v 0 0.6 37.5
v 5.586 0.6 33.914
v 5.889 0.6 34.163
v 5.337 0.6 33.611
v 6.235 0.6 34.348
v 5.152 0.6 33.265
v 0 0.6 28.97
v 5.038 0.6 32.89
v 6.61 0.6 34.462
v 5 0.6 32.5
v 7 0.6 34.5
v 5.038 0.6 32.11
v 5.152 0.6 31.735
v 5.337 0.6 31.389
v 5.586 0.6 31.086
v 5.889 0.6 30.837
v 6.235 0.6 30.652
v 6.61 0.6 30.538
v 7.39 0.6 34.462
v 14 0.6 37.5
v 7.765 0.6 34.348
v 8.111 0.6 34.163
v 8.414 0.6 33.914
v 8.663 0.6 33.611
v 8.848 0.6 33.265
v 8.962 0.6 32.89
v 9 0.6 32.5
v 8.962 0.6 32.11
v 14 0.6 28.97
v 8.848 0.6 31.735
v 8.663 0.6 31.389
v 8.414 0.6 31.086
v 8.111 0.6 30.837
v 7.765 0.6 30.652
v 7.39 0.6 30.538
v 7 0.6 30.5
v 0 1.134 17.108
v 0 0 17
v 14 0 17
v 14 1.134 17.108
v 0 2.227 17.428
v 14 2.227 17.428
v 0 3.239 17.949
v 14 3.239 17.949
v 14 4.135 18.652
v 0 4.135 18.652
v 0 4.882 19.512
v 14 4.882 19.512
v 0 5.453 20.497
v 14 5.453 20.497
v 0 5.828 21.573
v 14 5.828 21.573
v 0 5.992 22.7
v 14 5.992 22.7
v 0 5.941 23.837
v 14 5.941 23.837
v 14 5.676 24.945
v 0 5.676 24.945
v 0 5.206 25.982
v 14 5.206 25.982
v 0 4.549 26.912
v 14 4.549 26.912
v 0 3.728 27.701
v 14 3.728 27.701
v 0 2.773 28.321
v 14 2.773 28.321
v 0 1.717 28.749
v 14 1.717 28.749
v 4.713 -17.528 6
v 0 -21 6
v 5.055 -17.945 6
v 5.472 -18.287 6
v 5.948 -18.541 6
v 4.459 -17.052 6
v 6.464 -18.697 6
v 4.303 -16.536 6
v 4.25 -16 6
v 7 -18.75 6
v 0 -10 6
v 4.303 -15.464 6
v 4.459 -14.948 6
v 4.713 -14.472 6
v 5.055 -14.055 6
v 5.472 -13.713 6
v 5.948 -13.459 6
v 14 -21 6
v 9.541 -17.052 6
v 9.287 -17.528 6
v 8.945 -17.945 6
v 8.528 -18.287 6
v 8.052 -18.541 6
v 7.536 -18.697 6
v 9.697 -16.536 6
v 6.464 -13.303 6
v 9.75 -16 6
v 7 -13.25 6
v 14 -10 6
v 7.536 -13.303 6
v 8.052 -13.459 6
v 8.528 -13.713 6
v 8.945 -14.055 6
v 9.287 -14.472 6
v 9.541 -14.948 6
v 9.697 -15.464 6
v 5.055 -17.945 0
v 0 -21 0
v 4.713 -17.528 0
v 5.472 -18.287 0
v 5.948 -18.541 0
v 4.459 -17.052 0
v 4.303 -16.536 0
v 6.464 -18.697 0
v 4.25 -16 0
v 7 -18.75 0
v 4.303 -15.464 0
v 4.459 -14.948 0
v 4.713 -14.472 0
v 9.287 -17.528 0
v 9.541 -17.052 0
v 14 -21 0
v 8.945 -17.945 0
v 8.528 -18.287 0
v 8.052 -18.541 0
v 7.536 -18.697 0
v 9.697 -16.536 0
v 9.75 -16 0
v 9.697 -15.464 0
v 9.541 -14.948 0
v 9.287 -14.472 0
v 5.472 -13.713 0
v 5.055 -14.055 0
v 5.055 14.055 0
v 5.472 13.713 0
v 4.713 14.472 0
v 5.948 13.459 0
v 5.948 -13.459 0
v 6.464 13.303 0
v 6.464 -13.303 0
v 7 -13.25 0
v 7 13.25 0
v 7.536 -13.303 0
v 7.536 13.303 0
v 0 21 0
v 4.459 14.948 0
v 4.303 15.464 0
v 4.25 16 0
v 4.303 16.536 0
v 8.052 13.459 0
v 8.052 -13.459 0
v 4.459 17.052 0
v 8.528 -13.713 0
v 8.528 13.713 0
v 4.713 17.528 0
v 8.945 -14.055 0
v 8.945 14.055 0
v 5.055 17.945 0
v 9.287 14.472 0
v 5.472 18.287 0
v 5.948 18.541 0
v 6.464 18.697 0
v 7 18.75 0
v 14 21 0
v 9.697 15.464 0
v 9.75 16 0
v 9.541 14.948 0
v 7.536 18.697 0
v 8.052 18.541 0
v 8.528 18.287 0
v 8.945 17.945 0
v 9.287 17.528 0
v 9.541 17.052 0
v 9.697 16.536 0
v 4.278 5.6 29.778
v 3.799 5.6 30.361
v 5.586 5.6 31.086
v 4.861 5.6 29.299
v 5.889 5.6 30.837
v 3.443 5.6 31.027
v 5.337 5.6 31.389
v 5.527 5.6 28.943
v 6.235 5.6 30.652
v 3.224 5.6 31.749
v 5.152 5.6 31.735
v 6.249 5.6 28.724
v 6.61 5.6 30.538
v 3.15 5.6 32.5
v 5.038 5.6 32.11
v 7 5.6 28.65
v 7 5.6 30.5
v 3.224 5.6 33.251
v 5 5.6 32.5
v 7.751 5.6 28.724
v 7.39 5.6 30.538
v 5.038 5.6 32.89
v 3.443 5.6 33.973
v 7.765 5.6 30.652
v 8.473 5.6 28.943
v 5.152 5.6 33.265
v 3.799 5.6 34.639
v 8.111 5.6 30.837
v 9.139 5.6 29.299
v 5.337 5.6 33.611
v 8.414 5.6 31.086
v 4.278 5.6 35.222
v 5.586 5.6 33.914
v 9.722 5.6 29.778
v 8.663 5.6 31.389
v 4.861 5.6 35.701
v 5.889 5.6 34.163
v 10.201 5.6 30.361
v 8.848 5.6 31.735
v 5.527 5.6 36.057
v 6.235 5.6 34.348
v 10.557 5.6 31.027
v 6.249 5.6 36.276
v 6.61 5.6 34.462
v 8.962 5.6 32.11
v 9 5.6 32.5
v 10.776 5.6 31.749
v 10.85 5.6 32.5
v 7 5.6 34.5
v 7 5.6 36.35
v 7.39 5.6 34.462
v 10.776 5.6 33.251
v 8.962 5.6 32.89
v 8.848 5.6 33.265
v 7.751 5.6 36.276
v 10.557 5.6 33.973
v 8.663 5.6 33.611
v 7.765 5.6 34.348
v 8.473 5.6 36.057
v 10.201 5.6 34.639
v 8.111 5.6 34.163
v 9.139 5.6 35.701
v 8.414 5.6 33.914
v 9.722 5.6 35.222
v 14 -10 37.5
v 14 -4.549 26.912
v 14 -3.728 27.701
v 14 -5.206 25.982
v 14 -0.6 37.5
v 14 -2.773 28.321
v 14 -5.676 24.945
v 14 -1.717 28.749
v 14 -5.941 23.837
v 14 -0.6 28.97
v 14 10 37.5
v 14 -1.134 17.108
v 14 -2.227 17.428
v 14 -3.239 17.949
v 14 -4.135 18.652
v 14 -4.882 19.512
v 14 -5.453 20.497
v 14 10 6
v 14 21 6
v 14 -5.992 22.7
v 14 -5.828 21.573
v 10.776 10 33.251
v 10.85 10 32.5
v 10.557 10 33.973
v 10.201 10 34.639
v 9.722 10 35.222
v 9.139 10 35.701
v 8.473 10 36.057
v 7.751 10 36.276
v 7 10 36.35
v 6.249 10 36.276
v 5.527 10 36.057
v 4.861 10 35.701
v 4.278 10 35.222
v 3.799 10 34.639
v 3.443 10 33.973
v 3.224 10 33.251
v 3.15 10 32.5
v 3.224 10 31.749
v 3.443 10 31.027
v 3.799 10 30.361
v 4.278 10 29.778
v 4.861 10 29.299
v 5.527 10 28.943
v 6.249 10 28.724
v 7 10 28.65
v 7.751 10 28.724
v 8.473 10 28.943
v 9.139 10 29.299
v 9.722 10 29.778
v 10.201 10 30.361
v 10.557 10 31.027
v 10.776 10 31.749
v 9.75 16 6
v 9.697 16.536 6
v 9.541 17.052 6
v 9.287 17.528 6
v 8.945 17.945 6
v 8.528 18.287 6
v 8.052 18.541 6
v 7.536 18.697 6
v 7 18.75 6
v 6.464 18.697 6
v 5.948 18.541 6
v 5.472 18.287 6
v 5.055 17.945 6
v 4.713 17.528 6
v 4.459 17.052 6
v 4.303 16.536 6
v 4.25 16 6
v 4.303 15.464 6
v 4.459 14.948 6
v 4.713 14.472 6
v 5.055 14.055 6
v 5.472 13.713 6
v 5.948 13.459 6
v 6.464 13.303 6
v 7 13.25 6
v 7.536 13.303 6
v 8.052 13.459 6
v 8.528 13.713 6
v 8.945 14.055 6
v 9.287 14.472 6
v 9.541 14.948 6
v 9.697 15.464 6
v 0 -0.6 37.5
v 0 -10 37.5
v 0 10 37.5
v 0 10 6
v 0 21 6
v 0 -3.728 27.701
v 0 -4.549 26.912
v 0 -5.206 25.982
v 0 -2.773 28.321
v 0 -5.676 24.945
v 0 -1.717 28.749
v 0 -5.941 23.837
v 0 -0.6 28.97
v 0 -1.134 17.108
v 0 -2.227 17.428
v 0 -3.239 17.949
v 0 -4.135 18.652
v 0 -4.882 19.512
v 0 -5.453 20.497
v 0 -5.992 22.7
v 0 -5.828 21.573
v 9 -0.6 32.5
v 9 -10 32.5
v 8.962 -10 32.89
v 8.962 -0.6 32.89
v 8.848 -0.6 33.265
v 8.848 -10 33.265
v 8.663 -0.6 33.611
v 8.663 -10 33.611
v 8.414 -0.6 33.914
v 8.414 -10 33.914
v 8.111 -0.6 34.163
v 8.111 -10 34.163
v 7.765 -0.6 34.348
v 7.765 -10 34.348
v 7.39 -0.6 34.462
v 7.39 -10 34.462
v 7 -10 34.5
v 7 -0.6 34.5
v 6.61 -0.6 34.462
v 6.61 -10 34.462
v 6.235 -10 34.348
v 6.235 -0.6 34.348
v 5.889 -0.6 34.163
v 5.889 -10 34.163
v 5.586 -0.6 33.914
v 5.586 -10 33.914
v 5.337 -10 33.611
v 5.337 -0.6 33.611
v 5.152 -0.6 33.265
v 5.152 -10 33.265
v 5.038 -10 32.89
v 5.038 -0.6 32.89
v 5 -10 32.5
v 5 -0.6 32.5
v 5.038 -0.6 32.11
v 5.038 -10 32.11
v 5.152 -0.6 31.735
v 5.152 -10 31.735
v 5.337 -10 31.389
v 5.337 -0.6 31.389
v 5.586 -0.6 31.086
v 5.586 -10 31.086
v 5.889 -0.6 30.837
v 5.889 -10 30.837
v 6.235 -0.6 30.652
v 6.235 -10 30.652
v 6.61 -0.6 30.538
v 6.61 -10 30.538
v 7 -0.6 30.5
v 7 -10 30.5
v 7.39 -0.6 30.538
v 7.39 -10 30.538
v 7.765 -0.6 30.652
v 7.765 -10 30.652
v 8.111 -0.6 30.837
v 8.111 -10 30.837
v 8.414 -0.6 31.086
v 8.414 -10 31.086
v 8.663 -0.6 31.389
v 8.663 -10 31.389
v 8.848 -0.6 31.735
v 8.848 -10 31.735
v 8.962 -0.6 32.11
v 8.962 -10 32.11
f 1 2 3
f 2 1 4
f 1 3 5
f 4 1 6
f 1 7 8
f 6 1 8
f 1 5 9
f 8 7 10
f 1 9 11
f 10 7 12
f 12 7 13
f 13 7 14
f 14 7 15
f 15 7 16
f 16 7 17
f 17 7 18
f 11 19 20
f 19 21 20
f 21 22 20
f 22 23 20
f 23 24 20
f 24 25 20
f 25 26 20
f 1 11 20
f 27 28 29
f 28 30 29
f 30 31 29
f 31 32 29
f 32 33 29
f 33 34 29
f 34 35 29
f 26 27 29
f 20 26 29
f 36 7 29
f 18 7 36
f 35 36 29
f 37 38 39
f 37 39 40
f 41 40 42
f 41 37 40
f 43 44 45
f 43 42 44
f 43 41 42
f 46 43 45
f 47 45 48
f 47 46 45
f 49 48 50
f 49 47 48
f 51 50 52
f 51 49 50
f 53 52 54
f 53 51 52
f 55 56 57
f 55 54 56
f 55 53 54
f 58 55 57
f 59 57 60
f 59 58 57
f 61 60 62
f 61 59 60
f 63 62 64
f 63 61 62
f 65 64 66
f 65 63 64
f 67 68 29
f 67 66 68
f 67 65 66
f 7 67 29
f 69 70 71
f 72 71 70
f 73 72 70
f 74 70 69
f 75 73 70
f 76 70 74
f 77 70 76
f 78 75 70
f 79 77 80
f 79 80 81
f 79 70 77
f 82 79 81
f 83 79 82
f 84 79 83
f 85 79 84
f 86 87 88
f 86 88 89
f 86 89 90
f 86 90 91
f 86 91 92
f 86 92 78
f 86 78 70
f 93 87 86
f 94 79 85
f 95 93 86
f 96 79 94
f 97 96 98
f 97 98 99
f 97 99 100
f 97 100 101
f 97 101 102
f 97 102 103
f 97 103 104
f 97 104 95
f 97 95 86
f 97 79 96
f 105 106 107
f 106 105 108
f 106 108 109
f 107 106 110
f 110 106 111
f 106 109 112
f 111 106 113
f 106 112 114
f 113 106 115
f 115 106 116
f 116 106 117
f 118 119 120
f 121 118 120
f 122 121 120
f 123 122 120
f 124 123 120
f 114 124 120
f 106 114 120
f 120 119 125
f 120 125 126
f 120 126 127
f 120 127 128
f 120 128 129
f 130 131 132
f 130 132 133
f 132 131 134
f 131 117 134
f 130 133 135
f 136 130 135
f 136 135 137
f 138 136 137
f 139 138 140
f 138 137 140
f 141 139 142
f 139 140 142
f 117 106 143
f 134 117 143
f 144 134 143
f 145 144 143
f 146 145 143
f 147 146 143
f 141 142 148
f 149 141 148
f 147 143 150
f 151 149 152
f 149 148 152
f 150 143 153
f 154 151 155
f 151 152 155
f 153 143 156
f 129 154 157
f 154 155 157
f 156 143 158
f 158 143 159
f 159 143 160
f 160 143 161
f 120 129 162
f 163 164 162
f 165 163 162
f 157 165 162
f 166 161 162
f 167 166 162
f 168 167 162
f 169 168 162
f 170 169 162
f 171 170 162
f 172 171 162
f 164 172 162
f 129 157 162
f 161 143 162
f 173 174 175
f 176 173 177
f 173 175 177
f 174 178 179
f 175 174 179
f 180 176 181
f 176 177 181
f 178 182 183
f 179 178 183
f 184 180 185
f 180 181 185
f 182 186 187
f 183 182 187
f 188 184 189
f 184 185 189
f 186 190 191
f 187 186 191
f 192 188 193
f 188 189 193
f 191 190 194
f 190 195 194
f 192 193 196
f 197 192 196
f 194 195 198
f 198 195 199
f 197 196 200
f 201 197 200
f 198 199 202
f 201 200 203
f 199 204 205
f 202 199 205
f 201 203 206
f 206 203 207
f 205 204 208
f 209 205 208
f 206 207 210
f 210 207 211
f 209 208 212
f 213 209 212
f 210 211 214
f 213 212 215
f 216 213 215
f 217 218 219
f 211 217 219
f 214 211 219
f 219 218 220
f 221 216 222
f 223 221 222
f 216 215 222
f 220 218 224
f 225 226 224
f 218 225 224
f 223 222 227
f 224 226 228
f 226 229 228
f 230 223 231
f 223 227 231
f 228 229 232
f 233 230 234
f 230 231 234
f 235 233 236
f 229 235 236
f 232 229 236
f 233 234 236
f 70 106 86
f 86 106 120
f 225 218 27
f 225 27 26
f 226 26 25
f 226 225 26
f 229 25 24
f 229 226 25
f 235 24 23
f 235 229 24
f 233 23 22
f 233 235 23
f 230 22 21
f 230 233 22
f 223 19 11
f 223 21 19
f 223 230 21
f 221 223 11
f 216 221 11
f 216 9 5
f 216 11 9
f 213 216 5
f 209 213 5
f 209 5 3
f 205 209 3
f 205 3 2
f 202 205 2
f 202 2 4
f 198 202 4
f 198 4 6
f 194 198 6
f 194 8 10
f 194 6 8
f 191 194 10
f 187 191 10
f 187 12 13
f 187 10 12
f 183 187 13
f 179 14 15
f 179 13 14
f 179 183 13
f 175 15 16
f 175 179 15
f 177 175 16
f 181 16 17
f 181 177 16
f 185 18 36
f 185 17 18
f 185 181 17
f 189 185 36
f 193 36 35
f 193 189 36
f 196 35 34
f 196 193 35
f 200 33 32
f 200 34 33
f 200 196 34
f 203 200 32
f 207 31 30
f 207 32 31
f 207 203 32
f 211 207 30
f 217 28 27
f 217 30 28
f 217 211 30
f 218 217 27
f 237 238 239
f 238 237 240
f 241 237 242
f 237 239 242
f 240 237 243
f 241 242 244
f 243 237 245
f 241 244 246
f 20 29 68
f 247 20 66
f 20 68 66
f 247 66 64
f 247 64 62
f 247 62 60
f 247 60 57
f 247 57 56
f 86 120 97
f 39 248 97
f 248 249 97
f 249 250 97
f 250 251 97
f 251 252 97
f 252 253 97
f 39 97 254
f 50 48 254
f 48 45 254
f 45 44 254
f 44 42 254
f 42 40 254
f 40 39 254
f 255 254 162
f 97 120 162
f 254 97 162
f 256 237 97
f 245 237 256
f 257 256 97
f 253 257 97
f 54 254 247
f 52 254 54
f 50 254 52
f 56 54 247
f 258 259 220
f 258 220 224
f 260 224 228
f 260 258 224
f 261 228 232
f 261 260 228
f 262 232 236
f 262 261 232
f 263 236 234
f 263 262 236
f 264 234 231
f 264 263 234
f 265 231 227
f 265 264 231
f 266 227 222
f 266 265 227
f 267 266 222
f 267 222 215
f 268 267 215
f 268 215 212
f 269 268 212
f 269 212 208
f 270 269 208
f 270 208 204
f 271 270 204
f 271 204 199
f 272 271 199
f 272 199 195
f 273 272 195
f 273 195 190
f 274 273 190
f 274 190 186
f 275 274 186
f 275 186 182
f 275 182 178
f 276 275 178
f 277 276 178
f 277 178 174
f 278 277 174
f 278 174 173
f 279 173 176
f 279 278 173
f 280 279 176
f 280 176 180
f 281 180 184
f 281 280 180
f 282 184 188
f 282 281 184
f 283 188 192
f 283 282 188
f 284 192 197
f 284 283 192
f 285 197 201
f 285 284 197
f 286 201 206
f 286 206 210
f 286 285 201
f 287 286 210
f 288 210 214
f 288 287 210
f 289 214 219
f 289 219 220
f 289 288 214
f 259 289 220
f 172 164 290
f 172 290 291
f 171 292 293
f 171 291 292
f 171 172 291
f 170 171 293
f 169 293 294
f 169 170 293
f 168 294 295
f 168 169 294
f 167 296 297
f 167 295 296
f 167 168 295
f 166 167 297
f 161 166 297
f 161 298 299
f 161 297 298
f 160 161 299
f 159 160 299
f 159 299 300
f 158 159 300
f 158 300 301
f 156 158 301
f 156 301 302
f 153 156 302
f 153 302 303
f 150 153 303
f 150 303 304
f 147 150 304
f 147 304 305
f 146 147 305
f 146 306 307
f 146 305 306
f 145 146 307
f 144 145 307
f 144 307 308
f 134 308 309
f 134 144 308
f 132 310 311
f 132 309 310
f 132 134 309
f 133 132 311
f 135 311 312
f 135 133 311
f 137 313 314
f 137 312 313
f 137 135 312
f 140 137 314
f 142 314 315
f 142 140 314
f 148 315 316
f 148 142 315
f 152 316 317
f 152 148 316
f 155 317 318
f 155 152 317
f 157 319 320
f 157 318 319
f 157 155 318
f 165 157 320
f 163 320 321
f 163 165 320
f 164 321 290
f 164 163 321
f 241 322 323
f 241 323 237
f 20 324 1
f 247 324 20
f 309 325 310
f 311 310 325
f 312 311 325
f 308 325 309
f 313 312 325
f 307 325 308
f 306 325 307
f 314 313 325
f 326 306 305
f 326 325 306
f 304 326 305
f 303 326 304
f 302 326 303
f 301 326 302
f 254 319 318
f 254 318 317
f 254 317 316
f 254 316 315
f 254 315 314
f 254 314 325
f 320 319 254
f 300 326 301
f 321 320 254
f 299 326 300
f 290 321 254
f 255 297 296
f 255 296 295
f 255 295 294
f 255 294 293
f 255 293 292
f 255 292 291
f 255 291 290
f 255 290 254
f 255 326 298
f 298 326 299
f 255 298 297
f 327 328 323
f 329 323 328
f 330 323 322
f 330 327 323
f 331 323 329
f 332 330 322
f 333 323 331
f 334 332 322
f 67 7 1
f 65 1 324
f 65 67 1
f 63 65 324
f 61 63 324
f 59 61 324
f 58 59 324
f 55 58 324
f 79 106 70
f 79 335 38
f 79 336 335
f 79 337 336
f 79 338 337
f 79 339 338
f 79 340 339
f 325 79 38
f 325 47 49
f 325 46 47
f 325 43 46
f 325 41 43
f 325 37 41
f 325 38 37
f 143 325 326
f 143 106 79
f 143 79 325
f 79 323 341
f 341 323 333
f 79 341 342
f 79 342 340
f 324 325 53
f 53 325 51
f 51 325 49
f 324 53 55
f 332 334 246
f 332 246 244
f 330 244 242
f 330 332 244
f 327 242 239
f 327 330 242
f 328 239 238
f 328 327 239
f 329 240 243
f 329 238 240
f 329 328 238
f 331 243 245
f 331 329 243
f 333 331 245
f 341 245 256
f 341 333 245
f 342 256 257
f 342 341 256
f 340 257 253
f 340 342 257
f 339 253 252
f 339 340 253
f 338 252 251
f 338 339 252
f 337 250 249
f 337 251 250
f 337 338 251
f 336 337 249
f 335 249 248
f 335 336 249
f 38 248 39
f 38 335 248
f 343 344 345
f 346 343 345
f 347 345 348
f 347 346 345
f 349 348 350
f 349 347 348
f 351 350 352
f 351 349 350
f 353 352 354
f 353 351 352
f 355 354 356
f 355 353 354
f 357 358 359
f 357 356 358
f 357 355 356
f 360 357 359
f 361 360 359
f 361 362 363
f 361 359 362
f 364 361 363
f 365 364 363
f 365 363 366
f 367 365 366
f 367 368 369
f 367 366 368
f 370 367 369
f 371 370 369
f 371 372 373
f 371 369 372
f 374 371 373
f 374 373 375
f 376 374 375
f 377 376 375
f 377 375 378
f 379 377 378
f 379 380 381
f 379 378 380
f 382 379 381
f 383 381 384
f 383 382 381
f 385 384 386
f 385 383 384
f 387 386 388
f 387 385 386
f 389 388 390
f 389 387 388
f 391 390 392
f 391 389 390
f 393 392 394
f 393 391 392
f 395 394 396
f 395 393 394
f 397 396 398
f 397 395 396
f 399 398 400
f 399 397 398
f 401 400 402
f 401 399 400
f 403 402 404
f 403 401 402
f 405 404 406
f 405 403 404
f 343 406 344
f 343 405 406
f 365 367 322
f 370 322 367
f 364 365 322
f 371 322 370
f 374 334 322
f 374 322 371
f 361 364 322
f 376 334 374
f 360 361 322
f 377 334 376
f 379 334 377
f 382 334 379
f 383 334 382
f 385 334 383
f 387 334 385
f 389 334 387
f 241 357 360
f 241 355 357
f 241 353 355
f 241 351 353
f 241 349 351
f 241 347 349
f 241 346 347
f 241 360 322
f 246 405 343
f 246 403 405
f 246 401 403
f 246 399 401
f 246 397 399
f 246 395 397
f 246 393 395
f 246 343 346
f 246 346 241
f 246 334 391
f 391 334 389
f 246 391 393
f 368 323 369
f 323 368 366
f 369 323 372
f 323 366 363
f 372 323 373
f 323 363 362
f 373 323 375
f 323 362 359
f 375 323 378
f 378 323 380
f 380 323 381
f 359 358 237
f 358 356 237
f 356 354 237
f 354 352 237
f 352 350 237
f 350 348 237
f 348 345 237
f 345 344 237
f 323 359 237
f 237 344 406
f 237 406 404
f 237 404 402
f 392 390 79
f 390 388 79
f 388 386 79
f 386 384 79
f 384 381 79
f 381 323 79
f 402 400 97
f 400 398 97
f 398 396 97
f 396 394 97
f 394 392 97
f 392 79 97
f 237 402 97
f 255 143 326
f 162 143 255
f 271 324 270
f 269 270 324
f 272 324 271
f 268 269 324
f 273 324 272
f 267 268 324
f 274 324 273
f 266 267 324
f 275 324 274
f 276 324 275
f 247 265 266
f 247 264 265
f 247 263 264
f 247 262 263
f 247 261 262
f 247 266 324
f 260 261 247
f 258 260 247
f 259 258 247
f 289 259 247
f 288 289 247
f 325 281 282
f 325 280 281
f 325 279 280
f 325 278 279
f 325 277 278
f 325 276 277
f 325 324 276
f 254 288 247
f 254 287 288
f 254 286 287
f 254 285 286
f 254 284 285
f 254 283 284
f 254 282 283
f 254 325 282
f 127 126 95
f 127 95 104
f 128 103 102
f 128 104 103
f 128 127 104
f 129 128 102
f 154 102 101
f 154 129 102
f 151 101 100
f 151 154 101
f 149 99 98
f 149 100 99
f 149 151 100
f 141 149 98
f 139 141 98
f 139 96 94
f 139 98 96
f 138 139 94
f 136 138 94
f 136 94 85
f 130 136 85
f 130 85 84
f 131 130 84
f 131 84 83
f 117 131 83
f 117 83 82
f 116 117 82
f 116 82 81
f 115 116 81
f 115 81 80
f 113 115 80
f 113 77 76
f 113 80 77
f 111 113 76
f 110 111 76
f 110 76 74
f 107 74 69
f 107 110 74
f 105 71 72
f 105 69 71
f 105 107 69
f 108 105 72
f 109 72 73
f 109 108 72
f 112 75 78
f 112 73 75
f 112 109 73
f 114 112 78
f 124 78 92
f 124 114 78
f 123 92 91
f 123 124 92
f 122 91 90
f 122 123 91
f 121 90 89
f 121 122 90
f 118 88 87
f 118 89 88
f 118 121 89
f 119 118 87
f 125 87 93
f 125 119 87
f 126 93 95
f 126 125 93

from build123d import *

# Parameters (mm, degrees)
MBOLT_SH_L_R           = 2.75
MBOLT_SH_L_DEPTH       = 8
MBOLT_SH_R_R           = 2.75
MBOLT_SH_R_DEPTH       = 8
TBOLT_SHAFT_R          = 2
TBOLT_SHAFT_DEPTH      = 22
TBOLT_SHAFT_ROLL_ANGLE = 90
UP_SEP_W               = 16
UP_SEP_H               = 1.2
UP_SEP_DEPTH           = 15.5
SHAFT_HOLE_R           = 6
SHAFT_HOLE_DEPTH       = 16
SHAFT_HOLE_PITCH_ANGLE = 90
TBOLT_HEAD_R           = 3.85
TBOLT_HEAD_DEPTH       = 5.4
TBOLT_HEAD_ROLL_ANGLE  = 90
SIDE_BOX_L_W           = 14
SIDE_BOX_L_H           = 11
SIDE_BOX_L_DEPTH       = 31.5
SIDE_BOX_R_W           = 14
SIDE_BOX_R_H           = 11
SIDE_BOX_R_DEPTH       = 31.5
TOTAL_BOX_W            = 14
TOTAL_BOX_H            = 42
TOTAL_BOX_DEPTH        = 37.5


with BuildPart() as mbolt_sh_l:
    # mbolt_sh_l → mbolt_sh_l (new body)
    with BuildSketch(Plane(origin=(7, -16, -1), x_dir=(1, 0, 0), z_dir=(0, 0, 1))):
        Circle(MBOLT_SH_L_R)
    extrude(amount=MBOLT_SH_L_DEPTH)


with BuildPart() as mbolts_sh:
    # mbolt_sh_r → mbolt_sh_r (new body)
    with BuildSketch(Plane(origin=(7, 16, -1), x_dir=(1, 0, 0), z_dir=(0, 0, 1))):
        Circle(MBOLT_SH_R_R)
    extrude(amount=MBOLT_SH_R_DEPTH)

    # mbolts_sh: union mbolt_sh_l
    add(mbolt_sh_l.part)


with BuildPart() as tbolt_shaft:
    # tbolt_shaft → tbolt_shaft (new body)
    with BuildSketch(Plane.XY):
        Circle(TBOLT_SHAFT_R)
    extrude(amount=TBOLT_SHAFT_DEPTH)


with BuildPart() as tbolt_shaft_1:
    # tbolt_shaft roll: moved
    add(tbolt_shaft.part.rotate(Axis((0, 0, 0), (1, 0, 0)), TBOLT_SHAFT_ROLL_ANGLE))


with BuildPart() as tbolt_shaft_2:
    # tbolt_shaft placement: moved
    add(tbolt_shaft_1.part.moved(Location((7, 11, 32.5))))


with BuildPart() as up_sep:
    # up_sep → up_sep (new body)
    with BuildSketch(Plane(origin=(-1, -0.6, 24), x_dir=(1, 0, 0), z_dir=(0, 0, 1))):
        with Locations((8, 0.6)):
            Rectangle(UP_SEP_W, UP_SEP_H)
    extrude(amount=UP_SEP_DEPTH)


with BuildPart() as shaft_hole:
    # shaft_hole → shaft_hole (new body)
    with BuildSketch(Plane.XY):
        Circle(SHAFT_HOLE_R)
    extrude(amount=SHAFT_HOLE_DEPTH)


with BuildPart() as shaft_hole_1:
    # shaft_hole pitch: moved
    add(shaft_hole.part.rotate(Axis((0, 0, 0), (0, 1, 0)), SHAFT_HOLE_PITCH_ANGLE))


with BuildPart() as shaft_hole_2:
    # shaft_hole placement: moved
    add(shaft_hole_1.part.moved(Location((-1, 0, 23))))


with BuildPart() as fuse_shaft_holes:
    # tbolt_head → tbolt_head (new body)
    with BuildSketch(Plane.XY):
        Circle(TBOLT_HEAD_R)
    extrude(amount=TBOLT_HEAD_DEPTH)


with BuildPart() as fuse_shaft_holes_1:
    # tbolt_head roll: moved
    add(fuse_shaft_holes.part.rotate(Axis((0, 0, 0), (1, 0, 0)), TBOLT_HEAD_ROLL_ANGLE))


with BuildPart() as fuse_shaft_holes_2:
    # tbolt_head placement: moved
    add(fuse_shaft_holes_1.part.moved(Location((7, 11, 32.5))))

    # fuse_shaft_holes: union tbolt_shaft, up_sep, shaft_hole
    add(tbolt_shaft_2.part)
    add(up_sep.part)
    add(shaft_hole_2.part)


with BuildPart() as side_box_l:
    # side_box_l → side_box_l (new body)
    with BuildSketch(Plane(origin=(0, -21, 6), x_dir=(1, 0, 0), z_dir=(0, 0, 1))):
        with Locations((7, 5.5)):
            Rectangle(SIDE_BOX_L_W, SIDE_BOX_L_H)
    extrude(amount=SIDE_BOX_L_DEPTH)


with BuildPart() as side_boxes:
    # side_box_r → side_box_r (new body)
    with BuildSketch(Plane(origin=(0, 10, 6), x_dir=(1, 0, 0), z_dir=(0, 0, 1))):
        with Locations((7, 5.5)):
            Rectangle(SIDE_BOX_R_W, SIDE_BOX_R_H)
    extrude(amount=SIDE_BOX_R_DEPTH)

    # side_boxes: union side_box_l
    add(side_box_l.part)


with BuildPart() as sk_final:
    # total_box → total_box (new body)
    with BuildSketch(Plane(origin=(0, -21, 0), x_dir=(1, 0, 0), z_dir=(0, 0, 1))):
        with Locations((7, 21)):
            Rectangle(TOTAL_BOX_W, TOTAL_BOX_H)
    extrude(amount=TOTAL_BOX_DEPTH)

    # sk_shape: cut side_boxes
    add(side_boxes.part, mode=Mode.SUBTRACT)

    # sk_shape_w_holes: cut fuse_shaft_holes
    add(fuse_shaft_holes_2.part, mode=Mode.SUBTRACT)

    # sk_final: cut mbolts_sh
    add(mbolts_sh.part, mode=Mode.SUBTRACT)


solid = sk_final.part
